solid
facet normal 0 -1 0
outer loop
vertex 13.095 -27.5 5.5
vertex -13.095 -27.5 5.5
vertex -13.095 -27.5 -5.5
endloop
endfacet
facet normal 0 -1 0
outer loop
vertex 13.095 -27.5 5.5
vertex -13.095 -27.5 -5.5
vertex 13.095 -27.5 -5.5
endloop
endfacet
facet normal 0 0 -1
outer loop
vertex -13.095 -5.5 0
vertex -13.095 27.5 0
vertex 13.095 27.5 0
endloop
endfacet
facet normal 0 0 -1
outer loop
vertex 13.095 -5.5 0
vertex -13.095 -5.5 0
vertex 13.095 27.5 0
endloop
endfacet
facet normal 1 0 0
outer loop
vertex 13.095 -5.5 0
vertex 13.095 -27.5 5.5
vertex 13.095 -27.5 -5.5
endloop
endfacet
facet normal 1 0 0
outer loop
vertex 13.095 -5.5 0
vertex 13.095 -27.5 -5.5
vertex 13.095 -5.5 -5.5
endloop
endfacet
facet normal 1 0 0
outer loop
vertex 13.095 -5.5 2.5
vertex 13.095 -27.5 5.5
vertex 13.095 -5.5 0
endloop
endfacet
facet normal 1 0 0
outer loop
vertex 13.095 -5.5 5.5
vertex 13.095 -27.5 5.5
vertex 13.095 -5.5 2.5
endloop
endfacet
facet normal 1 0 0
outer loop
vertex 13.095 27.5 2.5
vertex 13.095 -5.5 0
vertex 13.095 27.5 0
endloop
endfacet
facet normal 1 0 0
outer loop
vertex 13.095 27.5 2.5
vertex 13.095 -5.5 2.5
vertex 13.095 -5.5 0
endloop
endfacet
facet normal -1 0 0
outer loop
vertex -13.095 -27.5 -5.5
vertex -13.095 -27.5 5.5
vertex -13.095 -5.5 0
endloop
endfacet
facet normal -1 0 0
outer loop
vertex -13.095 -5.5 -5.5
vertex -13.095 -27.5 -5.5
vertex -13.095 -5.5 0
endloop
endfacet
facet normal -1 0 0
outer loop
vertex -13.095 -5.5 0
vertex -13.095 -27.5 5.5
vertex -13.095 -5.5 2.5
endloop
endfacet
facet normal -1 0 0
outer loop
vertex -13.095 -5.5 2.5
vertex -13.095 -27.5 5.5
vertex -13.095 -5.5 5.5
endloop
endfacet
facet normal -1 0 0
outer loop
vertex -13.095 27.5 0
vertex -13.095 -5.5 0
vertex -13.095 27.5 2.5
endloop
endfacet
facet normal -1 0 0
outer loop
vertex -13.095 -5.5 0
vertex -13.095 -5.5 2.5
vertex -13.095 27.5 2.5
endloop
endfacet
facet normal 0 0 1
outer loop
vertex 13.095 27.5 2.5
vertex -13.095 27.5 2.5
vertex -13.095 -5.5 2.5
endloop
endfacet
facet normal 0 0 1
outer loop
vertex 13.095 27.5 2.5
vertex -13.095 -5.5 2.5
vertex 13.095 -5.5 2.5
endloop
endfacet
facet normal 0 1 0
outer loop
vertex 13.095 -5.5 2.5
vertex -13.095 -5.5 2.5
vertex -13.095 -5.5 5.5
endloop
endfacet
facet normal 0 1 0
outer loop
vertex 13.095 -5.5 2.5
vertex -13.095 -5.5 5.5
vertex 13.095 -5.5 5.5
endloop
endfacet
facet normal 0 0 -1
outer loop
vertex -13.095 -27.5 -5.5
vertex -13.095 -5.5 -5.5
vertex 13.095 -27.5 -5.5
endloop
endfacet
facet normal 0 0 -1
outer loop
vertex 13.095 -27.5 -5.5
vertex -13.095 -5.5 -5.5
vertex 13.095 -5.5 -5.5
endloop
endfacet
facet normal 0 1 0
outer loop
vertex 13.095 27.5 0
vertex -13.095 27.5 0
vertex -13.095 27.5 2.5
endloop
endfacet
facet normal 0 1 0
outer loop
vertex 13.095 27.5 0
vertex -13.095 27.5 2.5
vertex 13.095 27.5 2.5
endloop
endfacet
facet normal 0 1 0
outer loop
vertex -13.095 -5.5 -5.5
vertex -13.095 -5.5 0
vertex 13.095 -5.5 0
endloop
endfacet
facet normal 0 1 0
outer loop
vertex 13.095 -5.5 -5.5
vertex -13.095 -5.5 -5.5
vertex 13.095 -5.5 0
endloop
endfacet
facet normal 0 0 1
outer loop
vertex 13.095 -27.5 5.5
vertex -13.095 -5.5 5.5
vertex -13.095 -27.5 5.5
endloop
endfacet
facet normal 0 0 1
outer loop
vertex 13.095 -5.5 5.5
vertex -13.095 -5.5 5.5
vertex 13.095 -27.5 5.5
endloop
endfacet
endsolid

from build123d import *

# Parameters (mm, degrees)
F0_W     = 26.19
F0_H     = 33
F1_DEPTH = 2.5
F0_H_2   = 22
F2_DEPTH = 5.5
F3_DEPTH = 5.5


with BuildPart() as f1:
    # F0 (on Top) → F1 (new body)
    with BuildSketch(Plane.XY):
        with Locations((0, 11)):
            Rectangle(F0_W, F0_H)
    extrude(amount=F1_DEPTH)

    # F0 (on Top) → F2 (join)
    with BuildSketch(Plane.XY):
        with Locations((0, -16.5)):
            Rectangle(F0_W, F0_H_2)
    extrude(amount=F2_DEPTH)

    # F0 (on Top) → F3 (join)
    with BuildSketch(Plane.XY):
        with Locations((0, -16.5)):
            Rectangle(F0_W, F0_H_2)
    extrude(amount=-F3_DEPTH)


solid = f1.part
